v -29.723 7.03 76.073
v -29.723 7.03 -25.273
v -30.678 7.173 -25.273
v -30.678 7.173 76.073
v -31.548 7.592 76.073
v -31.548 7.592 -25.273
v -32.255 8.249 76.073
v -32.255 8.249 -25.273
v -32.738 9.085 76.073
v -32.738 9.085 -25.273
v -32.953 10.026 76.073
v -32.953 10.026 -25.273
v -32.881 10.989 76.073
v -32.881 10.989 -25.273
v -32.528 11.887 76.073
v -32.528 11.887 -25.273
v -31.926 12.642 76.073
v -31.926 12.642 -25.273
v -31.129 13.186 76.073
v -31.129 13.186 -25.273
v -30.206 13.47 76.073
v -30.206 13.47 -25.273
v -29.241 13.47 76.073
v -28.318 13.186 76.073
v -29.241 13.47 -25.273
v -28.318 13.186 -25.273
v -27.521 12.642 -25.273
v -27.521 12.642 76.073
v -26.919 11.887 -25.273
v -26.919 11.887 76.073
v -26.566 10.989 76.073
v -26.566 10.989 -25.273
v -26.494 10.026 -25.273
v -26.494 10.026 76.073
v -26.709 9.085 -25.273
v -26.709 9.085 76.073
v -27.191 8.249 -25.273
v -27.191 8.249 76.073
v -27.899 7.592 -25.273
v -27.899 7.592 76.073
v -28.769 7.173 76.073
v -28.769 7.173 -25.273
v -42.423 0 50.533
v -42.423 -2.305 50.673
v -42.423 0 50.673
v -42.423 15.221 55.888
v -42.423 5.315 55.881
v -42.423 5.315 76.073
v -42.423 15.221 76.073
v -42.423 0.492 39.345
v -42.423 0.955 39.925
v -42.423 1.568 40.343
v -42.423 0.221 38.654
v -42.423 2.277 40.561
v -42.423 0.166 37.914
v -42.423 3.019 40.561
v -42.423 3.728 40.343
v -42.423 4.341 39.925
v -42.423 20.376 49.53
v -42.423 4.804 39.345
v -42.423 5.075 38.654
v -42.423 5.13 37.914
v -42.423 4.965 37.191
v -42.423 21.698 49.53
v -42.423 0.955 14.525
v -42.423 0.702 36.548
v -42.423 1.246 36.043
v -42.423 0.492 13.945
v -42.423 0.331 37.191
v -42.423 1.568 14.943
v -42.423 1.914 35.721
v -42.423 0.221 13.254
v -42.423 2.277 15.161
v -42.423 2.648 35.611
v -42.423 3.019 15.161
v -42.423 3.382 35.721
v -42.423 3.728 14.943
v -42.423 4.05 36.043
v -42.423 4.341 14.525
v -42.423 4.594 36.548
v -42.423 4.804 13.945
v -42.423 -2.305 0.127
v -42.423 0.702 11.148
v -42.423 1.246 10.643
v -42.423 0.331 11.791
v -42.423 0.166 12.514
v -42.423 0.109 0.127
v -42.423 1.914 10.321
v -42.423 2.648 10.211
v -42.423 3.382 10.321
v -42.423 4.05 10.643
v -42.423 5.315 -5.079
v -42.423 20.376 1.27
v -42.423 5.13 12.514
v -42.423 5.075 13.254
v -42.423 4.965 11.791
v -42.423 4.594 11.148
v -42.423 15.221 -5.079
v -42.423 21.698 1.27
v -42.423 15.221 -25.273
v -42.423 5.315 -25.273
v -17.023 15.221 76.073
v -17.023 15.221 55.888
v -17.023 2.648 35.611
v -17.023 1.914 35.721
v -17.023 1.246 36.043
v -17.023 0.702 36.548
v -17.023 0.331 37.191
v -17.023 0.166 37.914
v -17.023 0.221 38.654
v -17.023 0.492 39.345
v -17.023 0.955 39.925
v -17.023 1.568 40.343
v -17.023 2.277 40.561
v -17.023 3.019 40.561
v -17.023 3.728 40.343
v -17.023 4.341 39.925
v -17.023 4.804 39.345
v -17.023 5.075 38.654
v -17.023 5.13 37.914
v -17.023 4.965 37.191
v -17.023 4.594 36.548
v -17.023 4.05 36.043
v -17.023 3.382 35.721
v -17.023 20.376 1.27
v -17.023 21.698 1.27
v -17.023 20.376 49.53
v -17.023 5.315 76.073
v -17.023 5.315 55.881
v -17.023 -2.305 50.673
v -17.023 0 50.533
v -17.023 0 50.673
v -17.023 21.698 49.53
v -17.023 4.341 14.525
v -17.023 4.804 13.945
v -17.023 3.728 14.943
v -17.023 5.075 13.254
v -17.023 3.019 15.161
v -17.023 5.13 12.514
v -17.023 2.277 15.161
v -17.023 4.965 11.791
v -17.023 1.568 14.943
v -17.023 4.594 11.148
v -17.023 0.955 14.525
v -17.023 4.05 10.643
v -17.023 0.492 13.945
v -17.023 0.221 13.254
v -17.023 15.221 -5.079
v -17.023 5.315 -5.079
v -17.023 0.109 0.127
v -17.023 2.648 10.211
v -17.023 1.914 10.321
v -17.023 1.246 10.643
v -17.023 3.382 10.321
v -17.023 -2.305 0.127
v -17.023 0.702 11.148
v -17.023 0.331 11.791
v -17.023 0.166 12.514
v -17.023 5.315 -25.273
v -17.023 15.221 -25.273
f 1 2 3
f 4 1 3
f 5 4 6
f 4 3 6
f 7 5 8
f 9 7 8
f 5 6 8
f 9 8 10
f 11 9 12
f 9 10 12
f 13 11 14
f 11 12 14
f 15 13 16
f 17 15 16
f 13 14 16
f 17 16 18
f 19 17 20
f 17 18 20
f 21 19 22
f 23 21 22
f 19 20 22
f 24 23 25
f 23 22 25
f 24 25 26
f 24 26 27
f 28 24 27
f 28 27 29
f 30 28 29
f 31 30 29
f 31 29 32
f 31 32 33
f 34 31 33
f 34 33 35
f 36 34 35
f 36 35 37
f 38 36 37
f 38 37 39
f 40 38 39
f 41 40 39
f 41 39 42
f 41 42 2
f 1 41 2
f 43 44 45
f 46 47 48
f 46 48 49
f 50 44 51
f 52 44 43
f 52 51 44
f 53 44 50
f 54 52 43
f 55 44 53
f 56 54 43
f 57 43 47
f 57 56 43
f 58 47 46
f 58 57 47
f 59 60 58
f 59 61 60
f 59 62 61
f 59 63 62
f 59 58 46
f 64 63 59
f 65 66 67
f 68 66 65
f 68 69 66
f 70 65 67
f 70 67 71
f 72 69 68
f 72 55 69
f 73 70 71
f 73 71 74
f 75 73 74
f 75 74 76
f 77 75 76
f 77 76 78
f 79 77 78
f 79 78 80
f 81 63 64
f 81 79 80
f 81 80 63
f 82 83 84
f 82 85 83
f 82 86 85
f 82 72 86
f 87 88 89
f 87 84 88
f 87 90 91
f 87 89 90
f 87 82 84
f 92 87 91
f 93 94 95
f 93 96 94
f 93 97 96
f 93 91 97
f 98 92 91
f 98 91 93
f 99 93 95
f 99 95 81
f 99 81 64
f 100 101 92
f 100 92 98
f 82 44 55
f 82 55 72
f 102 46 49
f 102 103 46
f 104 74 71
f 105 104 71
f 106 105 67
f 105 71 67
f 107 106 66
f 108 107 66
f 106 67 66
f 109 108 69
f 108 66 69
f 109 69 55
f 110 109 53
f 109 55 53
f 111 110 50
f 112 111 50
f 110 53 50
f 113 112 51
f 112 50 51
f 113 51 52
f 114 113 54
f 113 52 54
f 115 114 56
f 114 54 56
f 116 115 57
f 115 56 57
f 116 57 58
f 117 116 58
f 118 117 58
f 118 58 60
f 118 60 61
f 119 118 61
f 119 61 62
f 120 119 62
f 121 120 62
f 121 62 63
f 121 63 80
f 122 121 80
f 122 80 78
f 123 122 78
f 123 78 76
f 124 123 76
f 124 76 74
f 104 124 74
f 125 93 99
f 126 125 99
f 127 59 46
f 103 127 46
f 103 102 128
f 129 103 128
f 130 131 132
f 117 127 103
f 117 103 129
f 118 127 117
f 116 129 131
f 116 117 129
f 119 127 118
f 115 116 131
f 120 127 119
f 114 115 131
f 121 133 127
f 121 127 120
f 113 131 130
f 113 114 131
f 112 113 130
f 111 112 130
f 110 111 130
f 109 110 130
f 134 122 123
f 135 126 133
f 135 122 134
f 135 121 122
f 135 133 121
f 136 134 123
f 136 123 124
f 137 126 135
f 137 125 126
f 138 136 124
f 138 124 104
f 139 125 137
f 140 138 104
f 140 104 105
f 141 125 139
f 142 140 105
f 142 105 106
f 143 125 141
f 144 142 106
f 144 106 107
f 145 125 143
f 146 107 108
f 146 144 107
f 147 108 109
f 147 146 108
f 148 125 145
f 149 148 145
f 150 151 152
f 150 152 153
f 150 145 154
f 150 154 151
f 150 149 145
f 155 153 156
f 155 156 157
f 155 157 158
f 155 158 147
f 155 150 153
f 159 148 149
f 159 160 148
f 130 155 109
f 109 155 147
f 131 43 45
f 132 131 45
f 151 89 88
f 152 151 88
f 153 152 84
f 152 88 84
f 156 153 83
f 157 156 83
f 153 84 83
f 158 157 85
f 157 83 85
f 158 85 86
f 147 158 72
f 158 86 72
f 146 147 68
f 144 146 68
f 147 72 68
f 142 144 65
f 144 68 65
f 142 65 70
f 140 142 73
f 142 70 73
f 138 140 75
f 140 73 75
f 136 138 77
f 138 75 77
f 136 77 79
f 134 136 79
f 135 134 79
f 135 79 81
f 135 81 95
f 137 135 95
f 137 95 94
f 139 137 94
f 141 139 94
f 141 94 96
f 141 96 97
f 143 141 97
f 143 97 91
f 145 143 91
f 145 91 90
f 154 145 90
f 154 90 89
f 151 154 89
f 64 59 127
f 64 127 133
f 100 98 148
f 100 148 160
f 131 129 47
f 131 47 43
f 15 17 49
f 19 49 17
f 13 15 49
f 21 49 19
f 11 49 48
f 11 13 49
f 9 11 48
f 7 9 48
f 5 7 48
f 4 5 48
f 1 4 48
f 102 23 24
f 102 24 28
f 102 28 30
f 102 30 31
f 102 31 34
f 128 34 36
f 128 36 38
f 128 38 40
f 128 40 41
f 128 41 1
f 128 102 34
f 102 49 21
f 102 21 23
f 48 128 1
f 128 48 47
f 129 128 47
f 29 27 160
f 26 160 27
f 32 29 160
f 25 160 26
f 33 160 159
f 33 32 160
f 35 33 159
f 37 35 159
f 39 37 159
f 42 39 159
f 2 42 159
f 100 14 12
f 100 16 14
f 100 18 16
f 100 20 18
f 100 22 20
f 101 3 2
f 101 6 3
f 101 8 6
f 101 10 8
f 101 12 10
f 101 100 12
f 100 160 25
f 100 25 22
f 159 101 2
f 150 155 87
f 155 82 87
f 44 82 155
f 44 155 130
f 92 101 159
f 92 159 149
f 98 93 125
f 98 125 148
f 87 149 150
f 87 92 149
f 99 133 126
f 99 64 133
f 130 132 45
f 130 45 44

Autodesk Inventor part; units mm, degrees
ref_plane "YZ Plane" through (0, 0, 0) normal (1, 0, 0) x (0, 1, 0)
ref_plane "XZ Plane" through (0, 0, 0) normal (0, 1, 0) x (-1, 0, 0)
ref_plane "XY Plane" through (0, 0, 0) normal (0, 0, 1) x (1, 0, 0)
sketch "Sketch1" plane through (0, 0, 0) normal (0, 0, 1) x (1, 0, 0)
  line L0 (-42.4234, 22.9681) -> (-17.0234, 22.9681)
  line L1 (-17.0234, 22.9681) -> (-17.0234, -2.4319)
  line L2 (-17.0234, -2.4319) -> (-42.4234, -2.4319)
  line L3 (-42.4234, -2.4319) -> (-42.4234, 22.9681)
  point P0 (0, 0)
  dimension "d0" = 25.4
  dimension "d1" = 25.4
extrude "Extrusion1" add sketch "Sketch1" along normal blind 50.8
sketch "Sketch2" plane through (-17.0234, -2.4319, 0) normal (1, 0, 0) x (0, 0, -1)
  line L0 (-50.8, 22.86) -> (-50.8, 2.54)
  line L1 (-50.8, 2.54) -> (-55.88, 7.62)
  line L2 (-55.88, 7.62) -> (-76.2, 7.62)
  line L3 (-76.2, 7.62) -> (-76.2, 17.78)
  line L4 (-76.2, 17.78) -> (-55.88, 17.78)
  line L5 (-55.88, 17.78) -> (-50.8, 22.86)
  line L6 (-50.8, 0) -> (-50.8, 25.4) projected
  line L7 (0, 0) -> (-50.8, 0) projected
  point P0 (0, 2.4319)
  dimension "d4" = 25.4
  dimension "d5" = 20.32
  dimension "d6" = 5.08
  dimension "d7" = 5.08
  dimension "d8" = 5.08
  dimension "d9" = 5.08
  dimension "d10" = 0
  dimension "d11" = 2.54
extrude "Extrusion2" add sketch "Sketch2" against normal blind 25.4
sketch "Sketch3" plane through (-17.0234, -2.4319, 0) normal (1, 0, 0) x (0, 0, -1)
  line L0 (0, 20.4965) -> (0, 2.54)
  line L1 (0, 2.54) -> (5.08, 7.62)
  line L2 (5.08, 7.62) -> (25.4, 7.62)
  line L3 (25.4, 7.62) -> (25.4, 17.78)
  line L4 (25.4, 17.78) -> (5.08, 17.78)
  line L5 (5.08, 17.78) -> (0, 22.86)
  line L6 (0, 22.86) -> (0, 20.4965)
  line L7 (-55.88, 7.62) -> (-76.2, 7.62) projected
  line L8 (-76.2, 17.78) -> (-55.88, 17.78) projected
  line L9 (0, 25.4) -> (0, 0) projected
  line L10 (0, 0) -> (-50.8, 0) projected
  point P0 (0, 2.4319)
  dimension "d14" = 20.32
  dimension "d15" = 5.08
  dimension "d16" = 5.08
  dimension "d17" = 5.08
  dimension "d18" = 5.08
  dimension "d19" = 25.4
  dimension "d20" = 10.16
  dimension "d21" = 0
  dimension "d22" = 2.54
  dimension "d23" = 10.16
extrude "Extrusion3" add sketch "Sketch3" against normal blind 25.4
sketch "Sketch4" plane through (-17.0234, 5.1881, 76.2) normal (0, 0, 1) x (1, 0, 0)
  line L0 (0, 10.16) -> (-25.4, 10.16) projected
  line L1 (-25.4, 0) -> (-25.4, 10.16) projected
  point P0 (17.0234, -5.1881)
  point P1 (-12.7, 5.08)
  dimension "d26" = 5.08
  dimension "d27" = 12.7
hole "Hole1" at (-29.7234, 10.2681, 76.2) direction (0, 0, -1) diameter 6.477 end through all
sketch "Sketch5" plane through (-17.0234, 22.9681, 50.8) normal (1, 0, 0) x (0, 0, -1)
  line L0 (50.8, -25.4) -> (0, -25.4) projected
  point P0 (50.8, -22.9681)
  point P1 (12.7, -20.32)
  point P2 (38.1, -20.32)
  dimension "d35" = 5.08
  dimension "d36" = 5.08
  dimension "d37" = 12.7
  dimension "d38" = 12.7
hole "Hole2" at (-17.0234, 2.6481, 38.1) at (-17.0234, 2.6481, 12.7) direction (-1, 0, 0) diameter 4.9784 end through all thread size "1/4-20 UNC" class "2B" standard "ANSI Unified Screw Threads"
sketch "Sketch7" plane through (-17.0234, 22.9681, 50.8) normal (1, 0, 0) x (0, 0, -1)
  line L0 (-29.4216, -5.046) -> (-25.273, -5.046)
  line L1 (-25.273, -5.046) -> (-25.273, -20.1383)
  line L2 (-25.273, -20.1383) -> (-29.4216, -20.1383)
  line L3 (-29.4216, -20.1383) -> (-29.4216, -5.046)
  line L4 (-25.4, -17.78) -> (-25.4, -7.62) projected
  point P0 (50.8, -22.9681)
  dimension "d62" = 0.127
extrude "Extrusion4" cut sketch "Sketch7" against normal blind 50.8
sketch "Sketch8" plane through (-17.0234, -2.4319, 50.8) normal (1, 0, 0) x (0, 0, -1)
  line L0 (-27.9283, 21.8935) -> (-5.0883, 21.8935)
  line L1 (-5.0883, 21.8935) -> (-5.0883, 17.653)
  line L2 (-5.0883, 17.653) -> (-27.9283, 17.653)
  line L3 (-27.9283, 17.653) -> (-27.9283, 21.8935)
  line L4 (-25.273, 17.78) -> (-5.08, 17.78) projected
  line L5 (-26.1368, 7.747) -> (-5.0807, 7.747)
  line L6 (-5.0807, 7.747) -> (-5.0807, 5.4826)
  line L7 (-5.0807, 5.4826) -> (-26.1368, 5.4826)
  line L8 (-26.1368, 5.4826) -> (-26.1368, 7.747)
  line L9 (-5.08, 7.62) -> (-25.273, 7.62) projected
  point P0 (50.8, 2.4319)
  dimension "d65" = 0.127
  dimension "d66" = 0.127
extrude "Extrusion5" cut sketch "Sketch8" against normal blind 50.8
sketch "Sketch9" plane through (-42.4234, 22.9681, 0) normal (-1, 0, 0) x (0, 0, 1)
  line L0 (-28.1622, -4.7577) -> (-5.0787, -4.7577)
  line L1 (-5.0787, -4.7577) -> (-5.0787, -7.747)
  line L2 (-5.0787, -7.747) -> (-28.1622, -7.747)
  line L3 (-28.1622, -7.747) -> (-28.1622, -4.7577)
  line L4 (-27.0984, -17.653) -> (-5.0787, -17.653)
  line L5 (-5.0787, -17.653) -> (-5.0787, -20.2143)
  line L6 (-5.0787, -20.2143) -> (-27.0984, -20.2143)
  line L7 (-27.0984, -20.2143) -> (-27.0984, -17.653)
  line L8 (-29.1947, -5.6651) -> (-25.273, -5.6651)
  line L9 (-25.273, -5.6651) -> (-25.273, -18.8063)
  line L10 (-25.273, -18.8063) -> (-29.1947, -18.8063)
  line L11 (-29.1947, -18.8063) -> (-29.1947, -5.6651)
  line L12 (-25.4, -7.62) -> (-25.4, -17.78) projected
  line L13 (-5.08, -7.62) -> (-25.4, -7.62) projected
  line L14 (-25.4, -17.78) -> (-5.08, -17.78) projected
  point P0 (0, -22.9681)
  dimension "d69" = 0.127
  dimension "d70" = 0.127
  dimension "d71" = 0.127
extrude "Extrusion6" cut sketch "Sketch9" against normal blind 50.8
sketch "Sketch10" plane through (-42.4234, -2.4319, 0) normal (-1, 0, 0) x (0, 0, 1)
  line L0 (-2.7564, 0.127) -> (53.3126, 0.127)
  line L1 (53.3126, 0.127) -> (53.3126, -2.1248)
  line L2 (53.3126, -2.1248) -> (-2.7564, -2.1248)
  line L3 (-2.7564, -2.1248) -> (-2.7564, 0.127)
  line L4 (50.673, -3.7518) -> (52.4991, -3.7518)
  line L5 (52.4991, -3.7518) -> (52.4991, 2.4319)
  line L6 (52.4991, 2.4319) -> (50.673, 2.4319)
  line L7 (50.673, 2.4319) -> (50.673, -3.7518)
  line L8 (0.127, -3.5953) -> (-2.3183, -3.5953)
  line L9 (-2.3183, -3.5953) -> (-2.3183, 2.4319)
  line L10 (-2.3183, 2.4319) -> (0.127, 2.4319)
  line L11 (0.127, 2.4319) -> (0.127, -3.5953)
  line L12 (0, 0) -> (0, 2.54) projected
  line L13 (0, 0) -> (50.8, 0) projected
  line L14 (50.8, 2.54) -> (50.8, 0) projected
  point P0 (0, 2.4319)
  dimension "d74" = 0.127
  dimension "d75" = 0.127
  dimension "d76" = 0.127
extrude "Extrusion7" cut sketch "Sketch10" against normal blind 50.8
sketch "Sketch11" plane through (-42.4234, 22.9681, 0) normal (-1, 0, 0) x (0, 0, 1)
  line L0 (-3.471, 3.7894) -> (53.579, 3.7894)
  line L1 (53.579, 3.7894) -> (53.579, -1.27)
  line L2 (53.579, -1.27) -> (-3.471, -1.27)
  line L3 (-3.471, -1.27) -> (-3.471, 3.7894)
  line L4 (49.53, 5.7803) -> (53.579, 5.7803)
  line L5 (53.579, 5.7803) -> (53.579, -2.5925)
  line L6 (53.579, -2.5925) -> (49.53, -2.5925)
  line L7 (49.53, -2.5925) -> (49.53, 5.7803)
  line L8 (1.27, 6.2042) -> (-3.2289, 6.2042)
  line L9 (-3.2289, 6.2042) -> (-3.2289, -2.5925)
  line L10 (-3.2289, -2.5925) -> (1.27, -2.5925)
  line L11 (1.27, -2.5925) -> (1.27, 6.2042)
  line L12 (0, -2.54) -> (0, 0) projected
  line L13 (0, 0) -> (50.8, 0) projected
  line L14 (50.8, 0) -> (50.8, -2.54) projected
  point P0 (0, -22.9681)
  dimension "d79" = 1.27
  dimension "d80" = 1.27
  dimension "d81" = 1.27
extrude "Extrusion8" cut sketch "Sketch11" against normal blind 50.8
sketch "Sketch13" plane through (-42.4234, 5.3151, 76.073) normal (-1, 0, 0) x (0, 0, 1)
  line L0 (-81.1517, 0) -> (-81.1517, -0.1283) projected
  line L1 (-81.1517, 0) -> (-81.1517, -0.1283)
  line L2 (-81.1517, -0.1283) -> (-76.073, -5.207)
  line L3 (-81.1517, -0.1283) -> (-76.073, -5.207) projected
  line L4 (-76.073, -5.3151) -> (-75.946, -5.3151) projected
  line L5 (-76.073, -5.3151) -> (-75.946, -5.3151)
  line L6 (-75.946, -5.3151) -> (-75.946, -5.2062)
  line L7 (-76.073, -5.3151) -> (-76.073, -5.207) projected
  line L8 (-76.073, -5.3151) -> (-76.073, -5.207)
  line L9 (-81.1517, 0) -> (-75.946, -5.2062)
extrude "Extrusion9" cut sketch "Sketch13" against normal blind 50.8
sketch "Sketch14" plane through (-42.4234, 5.3151, 76.073) normal (-1, 0, 0) x (0, 0, 1)
  line L0 (-81.1517, 9.906) -> (-81.1517, 10.0343) projected
  line L1 (-81.1517, 9.906) -> (-81.1517, 10.0343)
  line L2 (-76.1255, 15.0605) -> (-74.803, 15.0605) projected
  line L3 (-81.1517, 10.0343) -> (-76.1255, 15.0605)
  line L4 (-81.1517, 10.0343) -> (-76.1255, 15.0605) projected
  line L5 (-76.1255, 15.0605) -> (-74.803, 15.0605)
  line L6 (-74.803, 15.0605) -> (-74.803, 16.383) projected
  line L7 (-74.803, 15.0605) -> (-81.1517, 9.906)
  point P0 (-76.073, -5.3151)
extrude "Extrusion10" cut sketch "Sketch14" against normal blind 50.8
sketch "Sketch16" plane through (-42.4234, 5.3151, 76.073) normal (-1, 0, 0) x (0, 0, 1)
  line L0 (-26.543, 15.0605) -> (-26.543, 16.383) projected
  line L1 (-20.193, 10.033) -> (-25.2205, 15.0605) projected
  line L2 (-26.543, 15.0605) -> (-25.2205, 15.0605)
  line L3 (-20.1847, 9.906) -> (-20.1847, 10.033) projected
  line L4 (-25.2205, 15.0605) -> (-20.1847, 10.033)
  line L5 (-26.543, 15.0605) -> (-20.1847, 9.906)
  line L6 (0, 9.906) -> (-20.1847, 9.906) projected
  line L7 (-20.1847, 9.906) -> (-20.1847, 10.033)
  point P0 (-76.073, -5.3151)
extrude "Extrusion11" cut sketch "Sketch16" against normal blind 50.8
sketch "Sketch18" plane through (-42.4234, 5.3151, 76.073) normal (-1, 0, 0) x (0, 0, 1)
  line L0 (-20.1923, 0) -> (-20.1923, -0.127) projected
  line L1 (-20.1923, 0) -> (-25.5398, -5.3151)
  line L2 (-25.5398, -5.3151) -> (-25.1146, -5.3151)
  line L3 (-25.1146, -5.3151) -> (-20.1923, -0.127)
  point P0 (-76.073, -5.3151)
extrude "Extrusion12" cut sketch "Sketch18" against normal blind 50.8
properties part number "SliderSlider"
